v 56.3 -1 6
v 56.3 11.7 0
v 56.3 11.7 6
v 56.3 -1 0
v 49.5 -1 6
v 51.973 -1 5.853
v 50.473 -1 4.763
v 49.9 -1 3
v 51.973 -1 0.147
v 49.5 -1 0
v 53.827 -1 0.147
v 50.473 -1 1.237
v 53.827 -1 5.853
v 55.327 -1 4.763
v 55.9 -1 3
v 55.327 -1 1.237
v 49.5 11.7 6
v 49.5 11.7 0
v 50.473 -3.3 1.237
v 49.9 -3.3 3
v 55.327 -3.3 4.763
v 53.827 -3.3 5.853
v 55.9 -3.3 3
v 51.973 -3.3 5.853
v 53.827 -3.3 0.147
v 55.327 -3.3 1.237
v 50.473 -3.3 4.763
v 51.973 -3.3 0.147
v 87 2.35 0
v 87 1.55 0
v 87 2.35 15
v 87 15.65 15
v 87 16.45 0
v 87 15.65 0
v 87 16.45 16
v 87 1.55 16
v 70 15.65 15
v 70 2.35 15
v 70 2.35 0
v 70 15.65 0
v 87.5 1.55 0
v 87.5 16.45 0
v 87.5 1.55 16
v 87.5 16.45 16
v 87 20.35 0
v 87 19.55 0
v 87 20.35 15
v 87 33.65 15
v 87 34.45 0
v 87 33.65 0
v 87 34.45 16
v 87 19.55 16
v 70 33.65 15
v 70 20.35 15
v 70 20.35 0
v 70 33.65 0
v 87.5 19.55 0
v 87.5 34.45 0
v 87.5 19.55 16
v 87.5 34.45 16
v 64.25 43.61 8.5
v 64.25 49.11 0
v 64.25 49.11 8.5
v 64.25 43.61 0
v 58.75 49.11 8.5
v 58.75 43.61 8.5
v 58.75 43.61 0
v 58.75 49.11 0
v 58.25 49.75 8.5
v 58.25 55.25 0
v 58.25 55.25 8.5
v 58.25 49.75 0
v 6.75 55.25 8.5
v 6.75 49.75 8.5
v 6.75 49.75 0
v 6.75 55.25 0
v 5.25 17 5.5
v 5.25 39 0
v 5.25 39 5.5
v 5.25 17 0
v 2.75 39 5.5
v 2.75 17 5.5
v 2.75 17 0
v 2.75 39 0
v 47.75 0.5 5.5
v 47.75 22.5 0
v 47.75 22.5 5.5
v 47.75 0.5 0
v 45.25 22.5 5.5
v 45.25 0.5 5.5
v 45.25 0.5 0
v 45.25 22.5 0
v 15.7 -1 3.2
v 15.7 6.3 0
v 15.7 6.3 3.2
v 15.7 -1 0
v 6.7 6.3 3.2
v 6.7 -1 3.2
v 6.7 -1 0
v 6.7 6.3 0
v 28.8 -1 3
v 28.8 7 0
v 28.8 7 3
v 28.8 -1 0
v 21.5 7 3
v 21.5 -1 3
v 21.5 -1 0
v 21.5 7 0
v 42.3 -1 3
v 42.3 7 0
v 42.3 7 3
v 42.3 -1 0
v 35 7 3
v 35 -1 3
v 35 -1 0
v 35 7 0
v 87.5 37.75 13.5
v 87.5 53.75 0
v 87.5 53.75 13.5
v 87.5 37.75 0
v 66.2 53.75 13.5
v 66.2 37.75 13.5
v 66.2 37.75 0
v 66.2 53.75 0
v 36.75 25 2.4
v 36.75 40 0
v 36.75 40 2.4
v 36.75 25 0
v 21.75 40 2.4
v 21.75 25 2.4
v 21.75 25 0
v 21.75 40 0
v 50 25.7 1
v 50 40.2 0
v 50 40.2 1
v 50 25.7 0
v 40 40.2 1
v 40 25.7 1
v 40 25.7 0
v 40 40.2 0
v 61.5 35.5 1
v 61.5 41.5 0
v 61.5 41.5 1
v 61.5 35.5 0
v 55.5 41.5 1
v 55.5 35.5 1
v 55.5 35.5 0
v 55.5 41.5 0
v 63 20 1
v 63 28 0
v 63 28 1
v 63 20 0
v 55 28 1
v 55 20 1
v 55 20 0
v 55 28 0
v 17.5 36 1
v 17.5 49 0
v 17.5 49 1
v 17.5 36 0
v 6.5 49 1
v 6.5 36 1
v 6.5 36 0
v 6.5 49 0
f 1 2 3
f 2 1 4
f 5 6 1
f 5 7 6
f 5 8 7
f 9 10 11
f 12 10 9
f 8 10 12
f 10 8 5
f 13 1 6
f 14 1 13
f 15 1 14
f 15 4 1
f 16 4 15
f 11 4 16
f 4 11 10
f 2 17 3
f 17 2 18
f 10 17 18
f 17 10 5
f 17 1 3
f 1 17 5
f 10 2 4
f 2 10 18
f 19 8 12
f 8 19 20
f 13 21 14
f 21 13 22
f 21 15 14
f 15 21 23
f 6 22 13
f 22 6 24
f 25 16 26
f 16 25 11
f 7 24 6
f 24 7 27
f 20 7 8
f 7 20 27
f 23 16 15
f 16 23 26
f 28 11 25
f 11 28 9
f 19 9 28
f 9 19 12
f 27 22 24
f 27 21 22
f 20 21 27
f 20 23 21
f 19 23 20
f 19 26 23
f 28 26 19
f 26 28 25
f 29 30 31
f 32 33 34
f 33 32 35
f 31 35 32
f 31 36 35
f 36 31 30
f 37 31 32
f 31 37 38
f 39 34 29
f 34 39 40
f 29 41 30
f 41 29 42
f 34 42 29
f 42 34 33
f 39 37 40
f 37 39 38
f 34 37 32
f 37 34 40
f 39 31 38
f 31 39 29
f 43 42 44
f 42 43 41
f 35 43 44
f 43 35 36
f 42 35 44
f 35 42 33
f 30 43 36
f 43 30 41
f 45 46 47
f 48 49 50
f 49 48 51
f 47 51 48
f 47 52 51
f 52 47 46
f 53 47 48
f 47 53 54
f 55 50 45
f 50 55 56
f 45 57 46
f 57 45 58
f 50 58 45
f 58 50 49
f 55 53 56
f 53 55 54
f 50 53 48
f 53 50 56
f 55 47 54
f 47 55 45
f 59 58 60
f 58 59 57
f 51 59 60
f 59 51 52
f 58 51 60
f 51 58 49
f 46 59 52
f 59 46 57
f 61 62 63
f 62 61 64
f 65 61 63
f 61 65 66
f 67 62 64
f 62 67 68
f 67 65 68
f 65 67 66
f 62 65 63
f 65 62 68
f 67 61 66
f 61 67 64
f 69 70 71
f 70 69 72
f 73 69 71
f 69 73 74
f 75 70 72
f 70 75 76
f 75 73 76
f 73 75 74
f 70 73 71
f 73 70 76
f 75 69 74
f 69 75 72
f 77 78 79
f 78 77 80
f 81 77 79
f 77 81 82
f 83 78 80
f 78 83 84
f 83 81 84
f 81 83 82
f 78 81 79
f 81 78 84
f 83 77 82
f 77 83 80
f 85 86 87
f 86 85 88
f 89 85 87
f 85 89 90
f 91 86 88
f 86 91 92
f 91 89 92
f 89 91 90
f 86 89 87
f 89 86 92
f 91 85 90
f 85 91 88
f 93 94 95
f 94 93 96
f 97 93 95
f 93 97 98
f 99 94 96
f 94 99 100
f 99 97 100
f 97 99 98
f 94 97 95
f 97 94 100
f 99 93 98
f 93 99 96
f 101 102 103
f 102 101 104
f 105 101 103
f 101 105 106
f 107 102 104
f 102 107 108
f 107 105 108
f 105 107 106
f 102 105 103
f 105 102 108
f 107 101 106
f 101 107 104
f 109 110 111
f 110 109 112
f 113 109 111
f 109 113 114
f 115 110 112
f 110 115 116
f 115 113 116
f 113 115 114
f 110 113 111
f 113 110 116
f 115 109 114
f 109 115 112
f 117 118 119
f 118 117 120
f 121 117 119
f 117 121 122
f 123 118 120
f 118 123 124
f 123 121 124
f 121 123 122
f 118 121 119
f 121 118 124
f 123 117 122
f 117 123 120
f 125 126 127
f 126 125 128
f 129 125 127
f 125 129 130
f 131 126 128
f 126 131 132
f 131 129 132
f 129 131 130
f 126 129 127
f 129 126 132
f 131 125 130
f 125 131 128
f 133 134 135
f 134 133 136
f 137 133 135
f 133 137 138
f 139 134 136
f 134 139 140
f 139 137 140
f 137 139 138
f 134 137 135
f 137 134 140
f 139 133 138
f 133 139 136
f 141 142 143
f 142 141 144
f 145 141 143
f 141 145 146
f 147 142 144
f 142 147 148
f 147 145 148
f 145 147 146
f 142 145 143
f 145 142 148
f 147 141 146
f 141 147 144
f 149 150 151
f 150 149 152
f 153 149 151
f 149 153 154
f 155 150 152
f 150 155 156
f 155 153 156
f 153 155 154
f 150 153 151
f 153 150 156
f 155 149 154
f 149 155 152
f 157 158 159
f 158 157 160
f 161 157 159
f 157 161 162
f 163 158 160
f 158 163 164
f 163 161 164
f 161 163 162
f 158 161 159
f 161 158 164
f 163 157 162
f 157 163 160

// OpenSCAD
/*
 * Title:   Raspberry Pi 4B
 * Author:  David Tillemans
 * Version: 0.1
 * Date:    06 May 2020
 *
 * Explanation
 * Dimensions of raspberry pi is:
 * Total Width = 88 (USB and ethernet stick out)
 * Total Breath = 58.3 (USB-C, HDMIs and AV stick out)
 * Details found on: https://www.raspberrypi.org/documentation/hardware/raspberrypi/mechanical/rpi_MECH_4b_4p0.pdf
 * 
 * raspberrypi4b(withpcb, withsdcard) : draws a raspberry Pi 4B 
 *     with withpcb = 0 : no pcb is drawn on the location of the components
 *     with withpcb = 1 : pcb is drawn with the components
 *     with withsdcard = 0 : no sdcard is drawn
 *     with withsdcard = 1 : the sdcard is drawn
 *            
 */

module poe_full() {
    cube([5.5, 5.5, 8.5]);    
}

module gpio_full() {
    cube([51.5, 5.5, 8.5]);    
}

module flat_connector_full() {
    cube([2.5, 22, 5.5]);    
}

module usbc_full() {
    cube([9.0, 7.3, 3.2]);    
}

module hdmi_full() {
    cube([7.3, 8, 3.0]);    
}

module av_full() {
    translate([3.4, 12.7, 3])
        rotate([90, 0, 0]) {
            union() {
                translate([-3.4, -3.0, 0]) 
                    cube([6.8, 6.0, 12.7]);
                cylinder(d = 6, 15);
            }        
        }
}

module usb_full() {
    cube([17, 13.3, 15.0]);
    translate([17, -0.8, 0])
        cube([0.5, 14.9, 16]);
}

module eth_full() {
    cube([21.3, 16, 13.5]);
}

module sdcard_full() {
    cube([11.5, 12, 1.8]); 
}

module sdcard_full_with_card() {
    cube([11.5, 12, 1.8]); 
    translate([-3.5, 0.5, 0])
        cube([15.5, 11, 1.8]); 
}

module cpu_full() {
    cube([15, 15, 2.4]); 
}

module memory_full() {
    cube([10, 14.5, 1.0]); 
}

module eth_chip_full() {
    cube([6, 6, 1.0]); 
}

module usb_chip_full() {
    cube([8, 8, 1.0]); 
}
module wifi_full() {
    cube([11, 13, 1.0]); 
}

// More detailed devices
module av_hollow() {
    translate([0, 3.4, 3])
        rotate([-90, 0, -90]) {
            difference()
            {
                union() {
                    translate([-3.4, -3.0, 0]) 
                        cube([6.8, 6.0, 12.7]);
                    cylinder(d = 6, 15);
                }
                translate([0,0,-1]) 
                    cylinder(d = 3.5, 17);
            }
        }
}

module pcb()
{
    difference() {
        translate([3, 3, 0]) {
            minkowski() {
                cube([85 - 6, 56 - 6, 0.8]);
                cylinder(r = 3, 0.8);        
            }
        }
        union() {
            translate([3.5, 3.5, -0.1])
                cylinder(d=2.7, 2);
            translate([3.5, 52.5, -0.1])
                cylinder(d=2.7, 2);
            translate([61.5, 3.5, -0.1])
                cylinder(d=2.7, 2);
            translate([61.5, 52.5, -0.1])
                cylinder(d=2.7, 2);
        }
    }
}

module raspberrypi4b(withpcb, withsdcard) {
    transpose_z = withpcb ? 1.6 : 0;

    if (withpcb) {
        pcb();
    }

    if (withsdcard) {
        translate([13-11.5, 22, -1.8])
//            sdcard_full();
            sdcard_full_with_card();
    }

    translate([58.75, 43.61, transpose_z])
        poe_full();
    translate([6.75, 49.75, transpose_z])
        gpio_full();
    translate([2.75, 17, transpose_z])
        flat_connector_full();
    translate([45.25, 0.5, transpose_z])
        flat_connector_full();
    translate([6.7, -1, transpose_z])
        usbc_full();
    translate([21.5, -1, transpose_z])
        hdmi_full();
    translate([35, -1, transpose_z])
        hdmi_full();
    translate([49.5, -1, transpose_z])
        av_full();
    translate([70, 2.35, transpose_z])
        usb_full();
    translate([70, 20.35, transpose_z])
        usb_full();
    translate([66.2, 37.75, transpose_z])
        eth_full();

    // Chips
    translate([21.75, 25, transpose_z])
        cpu_full();
    translate([40, 25.7, transpose_z])
        memory_full();
    translate([55.5, 35.5, transpose_z])
        eth_chip_full();
    translate([55, 20, transpose_z])
        usb_chip_full();
    translate([6.5, 36, transpose_z])
        wifi_full();
}

raspberrypi4b(0, 0);
